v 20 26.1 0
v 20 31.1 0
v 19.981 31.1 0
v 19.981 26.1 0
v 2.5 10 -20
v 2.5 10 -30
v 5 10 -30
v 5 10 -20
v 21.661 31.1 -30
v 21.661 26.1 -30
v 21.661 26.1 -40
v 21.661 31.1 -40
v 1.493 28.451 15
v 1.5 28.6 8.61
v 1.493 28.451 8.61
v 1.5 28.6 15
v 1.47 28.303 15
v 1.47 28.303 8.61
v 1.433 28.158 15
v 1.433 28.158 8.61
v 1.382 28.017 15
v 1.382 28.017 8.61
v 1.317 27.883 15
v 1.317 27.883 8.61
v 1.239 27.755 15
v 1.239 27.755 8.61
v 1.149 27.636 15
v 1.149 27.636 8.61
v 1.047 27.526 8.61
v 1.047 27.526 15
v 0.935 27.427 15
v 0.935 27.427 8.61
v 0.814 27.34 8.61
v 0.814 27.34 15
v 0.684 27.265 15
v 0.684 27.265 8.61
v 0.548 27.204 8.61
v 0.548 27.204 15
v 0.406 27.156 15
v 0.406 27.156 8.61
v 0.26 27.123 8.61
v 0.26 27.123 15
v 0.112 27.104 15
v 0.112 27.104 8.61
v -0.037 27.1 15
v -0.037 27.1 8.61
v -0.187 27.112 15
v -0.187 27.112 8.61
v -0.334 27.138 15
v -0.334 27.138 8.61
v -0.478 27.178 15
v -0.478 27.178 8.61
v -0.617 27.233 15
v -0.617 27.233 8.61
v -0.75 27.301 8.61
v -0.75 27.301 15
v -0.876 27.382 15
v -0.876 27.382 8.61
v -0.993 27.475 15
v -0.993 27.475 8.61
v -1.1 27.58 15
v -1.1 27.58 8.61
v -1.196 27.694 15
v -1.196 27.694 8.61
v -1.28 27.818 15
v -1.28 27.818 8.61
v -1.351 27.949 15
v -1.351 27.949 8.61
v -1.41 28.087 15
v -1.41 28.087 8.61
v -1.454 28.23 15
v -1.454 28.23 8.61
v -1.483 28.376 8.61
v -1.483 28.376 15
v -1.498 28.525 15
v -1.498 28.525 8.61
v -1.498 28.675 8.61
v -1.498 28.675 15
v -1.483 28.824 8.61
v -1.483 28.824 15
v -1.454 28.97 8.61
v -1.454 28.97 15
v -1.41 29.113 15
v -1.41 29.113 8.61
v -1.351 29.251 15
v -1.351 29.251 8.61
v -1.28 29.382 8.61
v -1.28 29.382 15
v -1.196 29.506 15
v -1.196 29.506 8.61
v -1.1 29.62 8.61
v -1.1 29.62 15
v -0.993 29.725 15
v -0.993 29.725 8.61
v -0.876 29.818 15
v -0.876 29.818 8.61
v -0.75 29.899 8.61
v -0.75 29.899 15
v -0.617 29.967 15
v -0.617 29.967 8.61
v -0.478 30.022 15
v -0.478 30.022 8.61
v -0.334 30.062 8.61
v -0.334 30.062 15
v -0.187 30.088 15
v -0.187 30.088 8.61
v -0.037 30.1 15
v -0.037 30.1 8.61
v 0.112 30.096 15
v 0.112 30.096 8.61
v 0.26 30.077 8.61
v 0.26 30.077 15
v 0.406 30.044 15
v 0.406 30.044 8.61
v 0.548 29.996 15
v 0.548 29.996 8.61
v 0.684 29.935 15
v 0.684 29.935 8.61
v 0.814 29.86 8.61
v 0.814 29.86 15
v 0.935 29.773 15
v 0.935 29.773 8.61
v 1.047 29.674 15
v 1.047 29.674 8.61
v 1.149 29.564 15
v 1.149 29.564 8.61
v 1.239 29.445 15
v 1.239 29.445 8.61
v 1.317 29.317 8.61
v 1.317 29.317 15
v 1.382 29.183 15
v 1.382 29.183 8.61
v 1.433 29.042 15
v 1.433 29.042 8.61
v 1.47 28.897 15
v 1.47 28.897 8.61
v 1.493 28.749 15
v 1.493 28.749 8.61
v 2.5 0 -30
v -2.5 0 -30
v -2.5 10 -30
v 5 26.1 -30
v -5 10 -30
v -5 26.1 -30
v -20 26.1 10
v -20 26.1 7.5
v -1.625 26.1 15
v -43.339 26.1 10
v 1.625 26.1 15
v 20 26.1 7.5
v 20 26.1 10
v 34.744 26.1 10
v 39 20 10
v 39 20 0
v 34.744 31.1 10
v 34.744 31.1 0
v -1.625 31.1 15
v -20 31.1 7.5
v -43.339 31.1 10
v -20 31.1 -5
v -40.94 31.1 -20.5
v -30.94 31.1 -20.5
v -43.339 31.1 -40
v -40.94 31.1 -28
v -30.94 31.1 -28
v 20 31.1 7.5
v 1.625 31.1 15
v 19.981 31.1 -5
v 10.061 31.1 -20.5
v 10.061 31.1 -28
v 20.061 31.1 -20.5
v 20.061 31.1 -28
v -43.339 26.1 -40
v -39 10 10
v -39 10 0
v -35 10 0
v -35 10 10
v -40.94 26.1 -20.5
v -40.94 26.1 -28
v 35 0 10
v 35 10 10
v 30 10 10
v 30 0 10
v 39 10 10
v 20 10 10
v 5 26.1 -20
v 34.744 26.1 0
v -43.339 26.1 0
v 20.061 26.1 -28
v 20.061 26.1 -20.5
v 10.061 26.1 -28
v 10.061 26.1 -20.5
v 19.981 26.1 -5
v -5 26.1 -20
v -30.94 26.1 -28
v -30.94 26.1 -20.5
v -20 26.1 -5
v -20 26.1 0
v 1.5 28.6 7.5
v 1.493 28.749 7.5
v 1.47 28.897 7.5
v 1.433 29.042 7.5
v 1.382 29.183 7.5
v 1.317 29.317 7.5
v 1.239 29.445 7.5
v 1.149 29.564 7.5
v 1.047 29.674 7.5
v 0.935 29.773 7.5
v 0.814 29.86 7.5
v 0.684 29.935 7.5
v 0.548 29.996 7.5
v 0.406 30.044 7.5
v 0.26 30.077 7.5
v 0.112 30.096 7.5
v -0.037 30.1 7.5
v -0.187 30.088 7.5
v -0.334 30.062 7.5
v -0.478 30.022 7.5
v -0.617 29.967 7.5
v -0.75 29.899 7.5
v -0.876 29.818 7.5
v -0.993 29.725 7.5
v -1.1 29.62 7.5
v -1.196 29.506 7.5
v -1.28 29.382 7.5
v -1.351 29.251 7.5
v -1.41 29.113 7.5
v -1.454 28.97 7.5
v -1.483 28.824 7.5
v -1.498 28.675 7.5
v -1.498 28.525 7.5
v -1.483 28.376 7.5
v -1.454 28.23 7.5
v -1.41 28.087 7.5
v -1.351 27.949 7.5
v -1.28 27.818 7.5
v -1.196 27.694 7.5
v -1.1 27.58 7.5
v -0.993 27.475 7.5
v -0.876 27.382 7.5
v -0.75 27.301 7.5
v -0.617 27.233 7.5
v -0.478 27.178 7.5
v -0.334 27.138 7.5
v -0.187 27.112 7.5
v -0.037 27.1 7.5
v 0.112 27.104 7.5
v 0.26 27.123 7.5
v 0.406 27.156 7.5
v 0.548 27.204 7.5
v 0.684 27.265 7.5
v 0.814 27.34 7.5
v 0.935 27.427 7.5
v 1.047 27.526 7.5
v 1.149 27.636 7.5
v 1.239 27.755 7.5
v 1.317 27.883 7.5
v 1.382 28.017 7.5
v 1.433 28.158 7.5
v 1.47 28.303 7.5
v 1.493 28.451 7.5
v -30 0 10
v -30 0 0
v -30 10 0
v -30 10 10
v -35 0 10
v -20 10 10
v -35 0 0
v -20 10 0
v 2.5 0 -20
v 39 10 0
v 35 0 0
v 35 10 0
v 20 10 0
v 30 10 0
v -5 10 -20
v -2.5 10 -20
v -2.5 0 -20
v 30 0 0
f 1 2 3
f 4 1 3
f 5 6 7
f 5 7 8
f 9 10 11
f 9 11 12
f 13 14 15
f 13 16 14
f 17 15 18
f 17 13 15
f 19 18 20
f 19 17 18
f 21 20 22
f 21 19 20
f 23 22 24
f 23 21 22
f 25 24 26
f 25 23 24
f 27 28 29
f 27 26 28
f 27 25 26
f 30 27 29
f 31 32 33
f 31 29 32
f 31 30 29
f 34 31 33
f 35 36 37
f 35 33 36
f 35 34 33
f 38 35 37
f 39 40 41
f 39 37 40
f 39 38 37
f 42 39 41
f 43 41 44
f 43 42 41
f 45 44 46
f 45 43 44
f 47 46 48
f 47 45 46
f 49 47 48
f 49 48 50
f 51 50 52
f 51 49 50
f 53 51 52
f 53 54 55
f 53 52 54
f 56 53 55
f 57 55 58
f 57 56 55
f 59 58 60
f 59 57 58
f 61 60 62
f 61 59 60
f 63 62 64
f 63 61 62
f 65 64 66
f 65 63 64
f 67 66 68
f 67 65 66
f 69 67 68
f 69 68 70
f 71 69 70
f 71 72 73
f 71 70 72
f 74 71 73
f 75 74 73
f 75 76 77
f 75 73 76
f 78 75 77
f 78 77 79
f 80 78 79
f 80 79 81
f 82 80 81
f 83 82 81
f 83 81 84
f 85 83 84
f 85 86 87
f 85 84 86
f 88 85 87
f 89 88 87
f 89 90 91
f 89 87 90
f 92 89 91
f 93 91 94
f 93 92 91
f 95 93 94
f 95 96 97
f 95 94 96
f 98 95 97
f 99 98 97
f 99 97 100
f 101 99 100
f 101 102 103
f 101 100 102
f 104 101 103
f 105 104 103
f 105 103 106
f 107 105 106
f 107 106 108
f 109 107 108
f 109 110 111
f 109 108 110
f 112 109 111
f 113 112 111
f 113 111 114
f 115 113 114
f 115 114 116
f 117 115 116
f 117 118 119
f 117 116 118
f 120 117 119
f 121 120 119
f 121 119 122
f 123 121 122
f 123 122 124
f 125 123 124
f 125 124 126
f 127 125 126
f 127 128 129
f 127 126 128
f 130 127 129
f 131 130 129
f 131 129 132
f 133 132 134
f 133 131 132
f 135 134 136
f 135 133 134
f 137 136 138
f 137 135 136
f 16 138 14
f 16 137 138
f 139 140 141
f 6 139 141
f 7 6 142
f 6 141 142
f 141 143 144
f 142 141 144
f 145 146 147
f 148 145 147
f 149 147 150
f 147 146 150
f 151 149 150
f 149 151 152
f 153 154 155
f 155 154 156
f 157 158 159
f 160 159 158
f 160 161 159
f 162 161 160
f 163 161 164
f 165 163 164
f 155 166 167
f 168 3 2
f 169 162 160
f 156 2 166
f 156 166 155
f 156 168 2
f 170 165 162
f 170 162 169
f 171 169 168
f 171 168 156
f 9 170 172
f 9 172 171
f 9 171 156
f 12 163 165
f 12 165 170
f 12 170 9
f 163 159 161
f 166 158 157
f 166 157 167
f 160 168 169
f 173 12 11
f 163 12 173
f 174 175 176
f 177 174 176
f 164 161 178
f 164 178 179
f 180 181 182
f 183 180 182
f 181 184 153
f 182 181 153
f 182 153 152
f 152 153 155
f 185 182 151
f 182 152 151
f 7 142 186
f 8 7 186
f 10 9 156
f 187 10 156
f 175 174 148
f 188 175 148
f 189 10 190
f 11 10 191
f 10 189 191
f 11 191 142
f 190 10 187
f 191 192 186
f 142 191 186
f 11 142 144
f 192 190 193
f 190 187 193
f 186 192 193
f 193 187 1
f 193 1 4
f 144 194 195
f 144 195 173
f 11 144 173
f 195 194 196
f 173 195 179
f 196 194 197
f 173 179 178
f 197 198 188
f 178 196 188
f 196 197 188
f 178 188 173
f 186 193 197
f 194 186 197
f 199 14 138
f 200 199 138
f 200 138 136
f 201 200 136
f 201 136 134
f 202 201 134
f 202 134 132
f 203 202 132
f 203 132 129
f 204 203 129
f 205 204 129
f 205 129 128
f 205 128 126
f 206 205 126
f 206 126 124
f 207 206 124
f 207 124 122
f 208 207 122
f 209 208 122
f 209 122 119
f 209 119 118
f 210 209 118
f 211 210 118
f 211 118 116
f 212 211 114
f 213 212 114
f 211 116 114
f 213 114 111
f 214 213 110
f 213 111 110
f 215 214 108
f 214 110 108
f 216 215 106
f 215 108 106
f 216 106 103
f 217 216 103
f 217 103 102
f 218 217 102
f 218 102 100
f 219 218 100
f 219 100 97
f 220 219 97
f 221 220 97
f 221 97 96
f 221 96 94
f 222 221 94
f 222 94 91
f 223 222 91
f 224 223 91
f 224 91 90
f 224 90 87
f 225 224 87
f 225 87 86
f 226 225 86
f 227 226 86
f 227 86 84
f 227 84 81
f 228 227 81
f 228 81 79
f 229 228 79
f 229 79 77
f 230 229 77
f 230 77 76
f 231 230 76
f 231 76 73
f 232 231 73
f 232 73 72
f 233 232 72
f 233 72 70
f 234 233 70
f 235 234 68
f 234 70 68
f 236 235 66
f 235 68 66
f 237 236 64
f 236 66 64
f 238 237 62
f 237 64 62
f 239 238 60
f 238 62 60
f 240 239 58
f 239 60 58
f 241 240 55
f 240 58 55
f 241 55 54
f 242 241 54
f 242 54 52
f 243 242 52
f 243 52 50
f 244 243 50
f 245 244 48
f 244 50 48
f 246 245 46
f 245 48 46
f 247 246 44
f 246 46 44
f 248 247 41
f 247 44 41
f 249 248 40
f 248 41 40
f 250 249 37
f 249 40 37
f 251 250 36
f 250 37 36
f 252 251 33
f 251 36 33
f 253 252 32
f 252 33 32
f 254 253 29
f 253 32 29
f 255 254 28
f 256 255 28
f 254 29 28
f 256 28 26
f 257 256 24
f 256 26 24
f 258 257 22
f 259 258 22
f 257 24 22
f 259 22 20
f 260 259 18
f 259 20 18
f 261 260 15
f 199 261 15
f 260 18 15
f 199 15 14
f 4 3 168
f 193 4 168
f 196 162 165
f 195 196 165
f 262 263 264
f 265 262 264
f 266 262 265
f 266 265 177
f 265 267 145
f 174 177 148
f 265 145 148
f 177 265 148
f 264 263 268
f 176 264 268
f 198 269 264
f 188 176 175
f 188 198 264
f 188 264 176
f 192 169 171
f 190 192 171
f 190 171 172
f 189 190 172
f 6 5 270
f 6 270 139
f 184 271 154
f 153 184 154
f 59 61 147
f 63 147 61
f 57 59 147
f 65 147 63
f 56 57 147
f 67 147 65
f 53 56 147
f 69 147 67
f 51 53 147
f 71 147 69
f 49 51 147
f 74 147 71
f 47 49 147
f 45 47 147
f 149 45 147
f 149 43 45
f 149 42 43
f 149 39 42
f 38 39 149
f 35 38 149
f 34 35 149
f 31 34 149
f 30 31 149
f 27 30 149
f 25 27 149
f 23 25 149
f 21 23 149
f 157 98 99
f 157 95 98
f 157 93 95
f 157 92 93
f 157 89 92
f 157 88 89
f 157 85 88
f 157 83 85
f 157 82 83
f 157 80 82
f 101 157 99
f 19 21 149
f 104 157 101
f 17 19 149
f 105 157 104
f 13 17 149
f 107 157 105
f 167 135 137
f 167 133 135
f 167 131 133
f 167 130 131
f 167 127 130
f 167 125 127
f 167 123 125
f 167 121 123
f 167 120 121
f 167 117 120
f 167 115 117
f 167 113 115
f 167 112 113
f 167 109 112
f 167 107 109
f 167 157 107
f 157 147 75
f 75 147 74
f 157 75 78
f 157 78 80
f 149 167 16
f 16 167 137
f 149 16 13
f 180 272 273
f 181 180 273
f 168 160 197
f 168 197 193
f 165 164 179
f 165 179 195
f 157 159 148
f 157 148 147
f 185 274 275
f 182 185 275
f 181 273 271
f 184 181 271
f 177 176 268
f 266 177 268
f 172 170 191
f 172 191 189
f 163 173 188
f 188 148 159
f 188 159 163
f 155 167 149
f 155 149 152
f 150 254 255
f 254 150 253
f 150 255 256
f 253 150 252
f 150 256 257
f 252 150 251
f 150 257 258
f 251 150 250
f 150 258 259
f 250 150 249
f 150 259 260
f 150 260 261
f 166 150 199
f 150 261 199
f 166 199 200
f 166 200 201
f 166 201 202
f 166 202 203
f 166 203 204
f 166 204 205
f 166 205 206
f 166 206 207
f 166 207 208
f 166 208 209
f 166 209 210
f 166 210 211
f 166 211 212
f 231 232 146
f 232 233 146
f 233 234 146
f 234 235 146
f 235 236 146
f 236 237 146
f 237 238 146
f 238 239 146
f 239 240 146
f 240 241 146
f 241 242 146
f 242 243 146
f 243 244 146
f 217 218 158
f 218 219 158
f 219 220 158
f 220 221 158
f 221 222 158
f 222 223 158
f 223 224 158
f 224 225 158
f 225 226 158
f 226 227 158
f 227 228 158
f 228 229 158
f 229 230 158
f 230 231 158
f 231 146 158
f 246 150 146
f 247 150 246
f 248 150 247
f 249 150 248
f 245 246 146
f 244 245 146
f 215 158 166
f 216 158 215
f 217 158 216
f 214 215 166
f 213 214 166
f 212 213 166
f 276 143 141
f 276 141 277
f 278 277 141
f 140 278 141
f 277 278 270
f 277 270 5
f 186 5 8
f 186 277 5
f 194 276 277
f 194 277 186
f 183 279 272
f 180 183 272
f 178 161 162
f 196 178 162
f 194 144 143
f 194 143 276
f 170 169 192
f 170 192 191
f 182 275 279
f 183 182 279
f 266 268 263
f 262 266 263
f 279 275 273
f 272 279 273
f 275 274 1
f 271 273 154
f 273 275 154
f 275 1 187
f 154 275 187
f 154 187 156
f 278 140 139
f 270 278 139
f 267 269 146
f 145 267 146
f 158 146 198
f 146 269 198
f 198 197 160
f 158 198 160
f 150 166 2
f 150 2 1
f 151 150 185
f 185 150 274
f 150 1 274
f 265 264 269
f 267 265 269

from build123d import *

# Parameters (mm, degrees)
SALIENTE_EXTRUIR1_DEPTH  = 10
CROQUIS2_W               = 5
CROQUIS2_H               = 45
CORTAR_EXTRUIR1_DEPTH    = 12.5
CROQUIS4_W               = 73.322426794
CROQUIS4_H               = 5
SALIENTE_EXTRUIR2_DEPTH  = 30
CROQUIS5_W               = 2.5
CROQUIS5_H               = 5
SALIENTE_EXTRUIR3_DEPTH  = 50
CROQUIS6_W               = 55.637494131
CROQUIS6_H               = 64.414873678
CORTAR_EXTRUIR2_DEPTH    = 55
CROQUIS7_R               = 1.5
CORTAR_EXTRUIR3_DEPTH    = 5
CROQUIS8_W               = 39.981329184
CROQUIS8_H               = 5
CORTAR_EXTRUIR4_DEPTH    = 10
CROQUIS9_W               = 10
CROQUIS9_H               = 7.5
SALIENTE_EXTRUIR4_DEPTH  = 21
CROQUIS11_R              = 2
CORTAR_EXTRUIR5_DEPTH    = 21
SALIENTE_EXTRUIR5_START  = -40
CROQUIS12_W              = 21.008716652
CROQUIS12_H              = 5
SALIENTE_EXTRUIR5_DEPTH  = 40
CORTAR_EXTRUIR6_DEPTH    = 62.200166864
CROQUIS15_W              = 5
CROQUIS15_H              = 10
SALIENTE_EXTRUIR6_DEPTH  = 31.1
SALIENTE_EXTRUIR7_DEPTH  = 10
SALIENTE_EXTRUIR8_DEPTH  = 5
CORTAR_EXTRUIR7_START    = -13
CROQUIS21_R              = 1.5
CORTAR_EXTRUIR7_DEPTH    = 13
CROQUIS22_W              = 10
CROQUIS22_H              = 7.5
CORTAR_EXTRUIR14_DEPTH   = 75.112484941
CROQUIS26_W              = 65
CROQUIS26_H              = 5
SALIENTE_EXTRUIR11_DEPTH = 10
SALIENTE_EXTRUIR12_DEPTH = 5
CORTAR_EXTRUIR15_START   = -10
CROQUIS28_R              = 1.5
CORTAR_EXTRUIR15_DEPTH   = 10
CROQUIS29_W              = 10
CROQUIS29_H              = 16.1
SALIENTE_EXTRUIR13_DEPTH = 5


with BuildPart() as part:
    # Croquis1 → Saliente-Extruir1 (new body)
    with BuildSketch(Plane.XY):
        with BuildLine():
            Line((-35, 10), (-35, 0))
            Line((-35, 0), (-30, 0))
            Line((-30, 0), (-30, 10))
            Line((-30, 10), (-20, 10))
            Line((-20, 10), (-20, 35.723707224))
            ThreePointArc((-20, 35.723707224), (0, 55.723707224), (20, 35.723707224))
            Line((20, 35.723707224), (20, 10))
            Line((20, 10), (30, 10))
            Line((30, 10), (30, 0))
            Line((30, 0), (35, 0))
            Line((35, 0), (35, 10))
            Line((35, 10), (39, 10))
            Line((39, 10), (39, 20))
            Line((39, 20), (14.443351433, 84.048407017))
            Line((14.443351433, 84.048407017), (13.447706691, 86.645237749))
            ThreePointArc((13.447706691, 86.645237749), (0, 95), (-13.447706691, 86.645237749))
            Line((-13.447706691, 86.645237749), (-14.443351433, 84.048407017))
            Line((-14.443351433, 84.048407017), (-39, 20))
            Line((-39, 20), (-39, 10))
            Line((-39, 10), (-35, 10))
        make_face()
        with BuildLine():
            ThreePointArc((1.5, 60), (0, 58.5), (-1.5, 60))
            Line((-1.5, 60), (-1.5, 80))
            ThreePointArc((-1.5, 80), (0, 81.5), (1.5, 80))
            Line((1.5, 80), (1.5, 60))
        make_face(mode=Mode.SUBTRACT)
    extrude(amount=SALIENTE_EXTRUIR1_DEPTH)

    # Croquis2 → Cortar-Extruir1 (cut, symmetric)
    with BuildSketch(Plane(origin=(0, 0, 0), x_dir=(0, 0, -1), z_dir=(1, 0, 0))):
        with Locations((-5, 72.5)):
            Rectangle(CROQUIS2_W, CROQUIS2_H)
    extrude(amount=CORTAR_EXTRUIR1_DEPTH, both=True, mode=Mode.SUBTRACT)

    # Croquis4 → Saliente-Extruir2 (add)
    with BuildSketch(Plane(origin=(0, 0, 0), x_dir=(-1, 0, 0), z_dir=(0, 0, -1))):
        with Locations((0, 28.6)):
            Rectangle(CROQUIS4_W, CROQUIS4_H)
    extrude(amount=SALIENTE_EXTRUIR2_DEPTH)

    # Croquis5 → Saliente-Extruir3 (add)
    with BuildSketch(Plane(origin=(-20, 0, 0), x_dir=(0, 0, -1), z_dir=(1, 0, 0))):
        with Locations((-8.75, 28.6)):
            Rectangle(CROQUIS5_W, CROQUIS5_H)
    extrude(amount=SALIENTE_EXTRUIR3_DEPTH)

    # Croquis6 → Cortar-Extruir2 (cut, symmetric)
    with BuildSketch(Plane(origin=(-20, 0, 0), x_dir=(0, 0, -1), z_dir=(1, 0, 0))):
        with Locations((17.818747066, 63.307436839)):
            Rectangle(CROQUIS6_W, CROQUIS6_H)
    extrude(amount=CORTAR_EXTRUIR2_DEPTH, both=True, mode=Mode.SUBTRACT)

    # Croquis7 → Cortar-Extruir3 (cut)
    with BuildSketch(Plane.XY.offset(10)):
        with Locations((0, 28.6)):
            Circle(CROQUIS7_R)
    extrude(amount=-CORTAR_EXTRUIR3_DEPTH, mode=Mode.SUBTRACT)

    # Croquis8 → Cortar-Extruir4 (cut)
    with BuildSketch(Plane(origin=(0, 31.1, 0), x_dir=(1, 0, 0), z_dir=(0, 1, 0))):
        with Locations((-0.009335408, 2.5)):
            Rectangle(CROQUIS8_W, CROQUIS8_H)
    extrude(amount=-CORTAR_EXTRUIR4_DEPTH, mode=Mode.SUBTRACT)

    # Croquis9 → Saliente-Extruir4 (add)
    with BuildSketch(Plane(origin=(0, 31.1, 0), x_dir=(1, 0, 0), z_dir=(0, 1, 0))):
        with Locations((15.061213397, 24.25)):
            Rectangle(CROQUIS9_W, CROQUIS9_H)
        with Locations((-35.940317185, 24.25)):
            Rectangle(CROQUIS9_W, CROQUIS9_H)
    extrude(amount=SALIENTE_EXTRUIR4_DEPTH)

    # Croquis11 → Cortar-Extruir5 (cut)
    with BuildSketch(Plane.XY.offset(-20.5)):
        with Locations((13.560448106, 46.6)):
            Circle(CROQUIS11_R)
        with Locations((13.560448106, 35.6)):
            Circle(CROQUIS11_R)
        with Locations((-34.439551894, 46.6)):
            Circle(CROQUIS11_R)
        with Locations((-34.439551894, 35.6)):
            Circle(CROQUIS11_R)
    extrude(amount=-CORTAR_EXTRUIR5_DEPTH, mode=Mode.SUBTRACT)

    # Croquis12 → Saliente-Extruir5 (add)
    with BuildSketch(Plane(origin=(0, 0, -30), x_dir=(-1, 0, 0), z_dir=(0, 0, -1)).offset(SALIENTE_EXTRUIR5_START)):
        with Locations((32.834428277, 28.6)):
            Rectangle(CROQUIS12_W, CROQUIS12_H)
    extrude(amount=SALIENTE_EXTRUIR5_DEPTH)

    # Croquis13 → Cortar-Extruir6 (cut, through all)
    with BuildSketch(Plane(origin=(0, 31.1, 0), x_dir=(1, 0, 0), z_dir=(0, 1, 0))):
        Polygon((34.744175198, 0), (36.661213397, 0), (36.661213397, 30), (21.661213397, 30), align=None)
    extrude(amount=-CORTAR_EXTRUIR6_DEPTH, mode=Mode.SUBTRACT)

    # Croquis15 → Saliente-Extruir6 (add)
    with BuildSketch(Plane(origin=(0, 31.1, 0), x_dir=(1, 0, 0), z_dir=(0, 1, 0))):
        with Locations((0, 25)):
            Rectangle(CROQUIS15_W, CROQUIS15_H)
    extrude(amount=-SALIENTE_EXTRUIR6_DEPTH)

    # Croquis18 → Saliente-Extruir7 (add)
    with BuildSketch(Plane.XY.offset(10)):
        Polygon((-39, 10), (-43.338786603, 26.1), (-36.661213397, 26.1), align=None)
    extrude(amount=-SALIENTE_EXTRUIR7_DEPTH)

    # Croquis22 → Cortar-Extruir14 (cut, through all)
    with BuildSketch(Plane(origin=(0, 52.1, 0), x_dir=(1, 0, 0), z_dir=(0, 1, 0))):
        with Locations((-35.940317185, 24.25)):
            Rectangle(CROQUIS22_W, CROQUIS22_H)
        with Locations((15.061213397, 24.25)):
            Rectangle(CROQUIS22_W, CROQUIS22_H)
    extrude(amount=-CORTAR_EXTRUIR14_DEPTH, mode=Mode.SUBTRACT)

    # Croquis26 → Saliente-Extruir11 (add)
    with BuildSketch(Plane(origin=(0, 0, -30), x_dir=(-1, 0, 0), z_dir=(0, 0, -1))):
        with Locations((10.838786603, 28.6)):
            Rectangle(CROQUIS26_W, CROQUIS26_H)
    extrude(amount=SALIENTE_EXTRUIR11_DEPTH)



with BuildPart() as body_2:
    # Croquis20 → Saliente-Extruir8 (new body)
    with BuildSketch(Plane(origin=(0, 31.1, 0), x_dir=(1, 0, 0), z_dir=(0, 1, 0))):
        Polygon((-1.624735856, -15), (1.624735856, -15), (34.744175198, -10), (-43.338786603, -10), align=None)
    extrude(amount=-SALIENTE_EXTRUIR8_DEPTH)

    # Croquis21 → Cortar-Extruir7 (cut)
    with BuildSketch(Plane(origin=(0, 0, 7.5), x_dir=(-1, 0, 0), z_dir=(0, 0, -1)).offset(CORTAR_EXTRUIR7_START)):
        with Locations((0, 28.6)):
            Circle(CROQUIS21_R)
    extrude(amount=CORTAR_EXTRUIR7_DEPTH, mode=Mode.SUBTRACT)


with BuildPart() as part_1:
    add(part.part)

    add(body_2.part)  # Saliente-Extruir12 merges body 2
    # Croquis27 → Saliente-Extruir12 (add)
    with BuildSketch(Plane(origin=(0, 31.1, 0), x_dir=(1, 0, 0), z_dir=(0, 1, 0))):
        Polygon((-43.338786603, -10), (-43.338786603, -8.609959484), (34.744175198, -8.609959484), (34.744175198, -10), (1.624735856, -15), (-1.624735856, -15), align=None)
    extrude(amount=-SALIENTE_EXTRUIR12_DEPTH)

    # Croquis28 → Cortar-Extruir15 (cut)
    with BuildSketch(Plane(origin=(0, 0, 8.609959484), x_dir=(-1, 0, 0), z_dir=(0, 0, -1)).offset(CORTAR_EXTRUIR15_START)):
        with Locations(Location((0, 28.6, 0), (0, 0, 180))):
            Circle(CROQUIS28_R)
    extrude(amount=CORTAR_EXTRUIR15_DEPTH, mode=Mode.SUBTRACT)

    # Croquis29 → Saliente-Extruir13 (add, symmetric)
    with BuildSketch(Plane.ZY):
        with Locations((-25, 18.05)):
            Rectangle(CROQUIS29_W, CROQUIS29_H)
    extrude(amount=SALIENTE_EXTRUIR13_DEPTH, both=True)


solid = part_1.part
